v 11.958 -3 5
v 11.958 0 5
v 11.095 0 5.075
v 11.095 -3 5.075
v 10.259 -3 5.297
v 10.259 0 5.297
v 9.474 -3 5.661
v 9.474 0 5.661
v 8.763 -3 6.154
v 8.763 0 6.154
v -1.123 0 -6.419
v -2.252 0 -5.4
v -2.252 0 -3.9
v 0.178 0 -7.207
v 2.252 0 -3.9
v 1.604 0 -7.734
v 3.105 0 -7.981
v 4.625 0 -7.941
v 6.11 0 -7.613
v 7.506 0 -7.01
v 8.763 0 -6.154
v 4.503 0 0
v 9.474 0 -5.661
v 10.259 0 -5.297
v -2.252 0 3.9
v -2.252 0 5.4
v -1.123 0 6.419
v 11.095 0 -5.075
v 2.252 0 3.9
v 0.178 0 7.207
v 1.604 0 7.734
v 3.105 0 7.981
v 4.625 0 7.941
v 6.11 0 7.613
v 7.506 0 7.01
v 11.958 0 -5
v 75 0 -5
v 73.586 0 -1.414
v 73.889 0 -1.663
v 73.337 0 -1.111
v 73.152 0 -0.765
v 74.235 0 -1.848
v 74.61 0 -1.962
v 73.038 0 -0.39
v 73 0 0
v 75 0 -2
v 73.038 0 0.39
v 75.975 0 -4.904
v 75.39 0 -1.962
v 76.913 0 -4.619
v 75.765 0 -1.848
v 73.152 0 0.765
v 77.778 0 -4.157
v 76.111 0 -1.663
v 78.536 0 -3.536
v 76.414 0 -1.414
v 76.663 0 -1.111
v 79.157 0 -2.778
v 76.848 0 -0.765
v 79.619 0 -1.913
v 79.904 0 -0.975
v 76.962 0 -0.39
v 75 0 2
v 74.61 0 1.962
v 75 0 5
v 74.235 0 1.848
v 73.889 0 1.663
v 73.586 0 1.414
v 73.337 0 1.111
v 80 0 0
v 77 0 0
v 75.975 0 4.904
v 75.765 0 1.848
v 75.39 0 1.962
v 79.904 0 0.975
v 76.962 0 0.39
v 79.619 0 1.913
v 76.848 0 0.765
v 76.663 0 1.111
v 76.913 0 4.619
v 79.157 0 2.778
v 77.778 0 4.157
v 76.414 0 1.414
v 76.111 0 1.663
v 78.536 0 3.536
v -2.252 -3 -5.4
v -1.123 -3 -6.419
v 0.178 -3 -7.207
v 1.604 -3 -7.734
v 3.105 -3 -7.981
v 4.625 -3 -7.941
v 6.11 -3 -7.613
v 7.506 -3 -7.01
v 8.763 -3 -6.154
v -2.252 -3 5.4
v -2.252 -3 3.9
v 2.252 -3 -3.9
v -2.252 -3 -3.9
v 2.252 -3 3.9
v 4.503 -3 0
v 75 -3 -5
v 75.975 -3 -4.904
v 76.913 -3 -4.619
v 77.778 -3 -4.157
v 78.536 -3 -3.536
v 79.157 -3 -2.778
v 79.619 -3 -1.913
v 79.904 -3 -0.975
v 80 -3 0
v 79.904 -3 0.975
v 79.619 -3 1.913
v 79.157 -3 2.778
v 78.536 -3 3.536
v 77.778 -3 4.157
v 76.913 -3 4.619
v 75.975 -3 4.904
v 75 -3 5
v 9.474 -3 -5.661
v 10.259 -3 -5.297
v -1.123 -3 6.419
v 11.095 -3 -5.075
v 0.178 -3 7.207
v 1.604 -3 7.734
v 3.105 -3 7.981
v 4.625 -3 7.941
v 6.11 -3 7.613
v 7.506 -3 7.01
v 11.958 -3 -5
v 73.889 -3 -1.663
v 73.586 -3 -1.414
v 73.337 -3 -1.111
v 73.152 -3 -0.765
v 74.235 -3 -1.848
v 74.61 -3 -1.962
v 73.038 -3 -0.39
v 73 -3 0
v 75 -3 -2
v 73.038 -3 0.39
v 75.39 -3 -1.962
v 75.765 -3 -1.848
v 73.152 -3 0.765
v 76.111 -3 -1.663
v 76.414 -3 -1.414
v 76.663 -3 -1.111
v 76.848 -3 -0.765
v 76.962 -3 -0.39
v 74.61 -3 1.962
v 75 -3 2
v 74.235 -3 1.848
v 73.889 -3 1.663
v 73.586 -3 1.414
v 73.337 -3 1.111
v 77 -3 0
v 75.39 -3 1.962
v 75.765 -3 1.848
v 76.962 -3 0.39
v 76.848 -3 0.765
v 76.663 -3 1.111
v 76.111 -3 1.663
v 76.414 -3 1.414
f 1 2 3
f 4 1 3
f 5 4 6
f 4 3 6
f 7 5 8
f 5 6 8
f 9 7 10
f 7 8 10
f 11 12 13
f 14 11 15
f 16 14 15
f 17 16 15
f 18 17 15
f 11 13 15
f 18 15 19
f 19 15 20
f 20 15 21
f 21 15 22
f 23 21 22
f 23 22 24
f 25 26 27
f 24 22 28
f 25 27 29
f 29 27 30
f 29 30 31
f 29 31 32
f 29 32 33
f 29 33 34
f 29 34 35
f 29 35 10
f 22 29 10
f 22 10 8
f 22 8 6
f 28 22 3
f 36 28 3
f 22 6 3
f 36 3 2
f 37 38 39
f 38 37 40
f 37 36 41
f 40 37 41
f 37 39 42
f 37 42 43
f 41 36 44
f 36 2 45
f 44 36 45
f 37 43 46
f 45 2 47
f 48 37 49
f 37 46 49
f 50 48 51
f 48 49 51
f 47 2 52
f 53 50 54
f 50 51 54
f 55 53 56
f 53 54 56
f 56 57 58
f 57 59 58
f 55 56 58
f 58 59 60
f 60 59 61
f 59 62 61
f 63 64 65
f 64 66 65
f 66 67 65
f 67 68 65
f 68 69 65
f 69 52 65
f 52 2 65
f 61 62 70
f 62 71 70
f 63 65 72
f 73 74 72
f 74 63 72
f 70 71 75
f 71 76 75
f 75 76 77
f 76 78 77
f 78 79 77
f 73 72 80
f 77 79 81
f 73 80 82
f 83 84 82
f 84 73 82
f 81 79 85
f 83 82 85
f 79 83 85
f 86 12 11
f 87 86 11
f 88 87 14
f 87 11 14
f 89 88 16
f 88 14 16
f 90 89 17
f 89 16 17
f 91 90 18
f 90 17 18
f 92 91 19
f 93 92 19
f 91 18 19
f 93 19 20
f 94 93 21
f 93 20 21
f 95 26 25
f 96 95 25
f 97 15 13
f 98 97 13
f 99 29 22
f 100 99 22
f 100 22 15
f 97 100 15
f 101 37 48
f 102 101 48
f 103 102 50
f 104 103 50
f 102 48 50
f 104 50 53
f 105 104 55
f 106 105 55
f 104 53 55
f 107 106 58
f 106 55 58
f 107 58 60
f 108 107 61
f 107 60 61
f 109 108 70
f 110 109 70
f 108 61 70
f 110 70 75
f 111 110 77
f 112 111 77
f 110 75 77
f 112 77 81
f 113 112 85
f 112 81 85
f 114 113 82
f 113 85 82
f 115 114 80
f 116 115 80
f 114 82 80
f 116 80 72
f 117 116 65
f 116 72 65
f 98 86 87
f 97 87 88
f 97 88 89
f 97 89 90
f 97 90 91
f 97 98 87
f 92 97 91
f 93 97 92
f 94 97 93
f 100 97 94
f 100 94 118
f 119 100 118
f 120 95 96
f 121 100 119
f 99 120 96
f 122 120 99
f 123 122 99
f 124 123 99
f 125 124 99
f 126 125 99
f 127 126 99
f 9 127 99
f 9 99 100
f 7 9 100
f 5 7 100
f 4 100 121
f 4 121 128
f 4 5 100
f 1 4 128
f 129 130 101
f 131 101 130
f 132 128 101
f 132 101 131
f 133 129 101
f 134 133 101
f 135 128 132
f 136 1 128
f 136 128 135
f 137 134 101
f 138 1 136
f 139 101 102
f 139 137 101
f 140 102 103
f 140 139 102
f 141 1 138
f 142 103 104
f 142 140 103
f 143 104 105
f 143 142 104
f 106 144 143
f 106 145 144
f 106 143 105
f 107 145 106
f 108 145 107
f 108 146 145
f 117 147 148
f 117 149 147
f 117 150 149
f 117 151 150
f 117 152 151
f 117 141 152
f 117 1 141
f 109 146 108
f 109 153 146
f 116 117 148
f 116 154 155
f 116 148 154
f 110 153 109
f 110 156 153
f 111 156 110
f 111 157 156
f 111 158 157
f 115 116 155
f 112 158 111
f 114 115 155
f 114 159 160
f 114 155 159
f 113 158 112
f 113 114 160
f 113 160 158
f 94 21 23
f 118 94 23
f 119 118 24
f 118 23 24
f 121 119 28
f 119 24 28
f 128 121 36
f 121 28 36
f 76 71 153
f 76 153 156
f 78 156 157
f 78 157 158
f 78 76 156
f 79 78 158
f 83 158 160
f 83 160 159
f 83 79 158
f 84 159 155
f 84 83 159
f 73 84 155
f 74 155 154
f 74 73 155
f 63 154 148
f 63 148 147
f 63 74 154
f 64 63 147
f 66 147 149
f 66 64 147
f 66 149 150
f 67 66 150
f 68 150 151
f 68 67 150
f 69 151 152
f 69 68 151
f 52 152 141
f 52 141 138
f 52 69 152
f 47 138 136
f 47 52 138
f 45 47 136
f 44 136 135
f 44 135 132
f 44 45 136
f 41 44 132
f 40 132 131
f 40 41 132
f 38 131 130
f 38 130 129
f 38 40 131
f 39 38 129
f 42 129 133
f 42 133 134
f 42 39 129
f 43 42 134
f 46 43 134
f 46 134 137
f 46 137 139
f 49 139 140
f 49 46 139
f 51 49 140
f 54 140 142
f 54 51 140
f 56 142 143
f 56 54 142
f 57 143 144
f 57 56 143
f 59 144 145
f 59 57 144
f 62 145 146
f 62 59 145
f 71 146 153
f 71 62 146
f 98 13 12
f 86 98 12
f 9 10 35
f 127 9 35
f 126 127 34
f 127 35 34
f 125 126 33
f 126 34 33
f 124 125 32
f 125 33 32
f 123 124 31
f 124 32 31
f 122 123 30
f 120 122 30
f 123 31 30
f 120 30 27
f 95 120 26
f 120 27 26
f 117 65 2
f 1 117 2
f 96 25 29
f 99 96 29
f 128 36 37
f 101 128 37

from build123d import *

# Parameters (mm, degrees)
F0_R     = 2
F1_DEPTH = 3


with BuildPart() as f1:
    # F0 (on Front) → F1 (new body)
    with BuildSketch(Plane.XZ):
        with BuildLine():
            Line((4.503332, 0), (2.251666, -3.9))
            Line((2.251666, -3.9), (-2.251666, -3.9))
            Line((-2.251666, -3.9), (-2.251666, -5.4))
            ThreePointArc((-2.251666, -5.4), (3.104614, -7.981328), (8.762644, -6.153846))
            ThreePointArc((8.762644, -6.153846), (10.259084, -5.2973), (11.9575, -5))
            Line((11.9575, -5), (75, -5))
            ThreePointArc((75, -5), (80, 0), (75, 5))
            Line((75, 5), (11.9575, 5))
            ThreePointArc((11.9575, 5), (10.259084, 5.2973), (8.762644, 6.153846))
            ThreePointArc((8.762644, 6.153846), (3.104614, 7.981328), (-2.251666, 5.4))
            Line((-2.251666, 5.4), (-2.251666, 3.9))
            Line((-2.251666, 3.9), (2.251666, 3.9))
            Line((2.251666, 3.9), (4.503332, 0))
        make_face()
        with Locations((75, 0)):
            Circle(F0_R, mode=Mode.SUBTRACT)
    extrude(amount=F1_DEPTH)


solid = f1.part
